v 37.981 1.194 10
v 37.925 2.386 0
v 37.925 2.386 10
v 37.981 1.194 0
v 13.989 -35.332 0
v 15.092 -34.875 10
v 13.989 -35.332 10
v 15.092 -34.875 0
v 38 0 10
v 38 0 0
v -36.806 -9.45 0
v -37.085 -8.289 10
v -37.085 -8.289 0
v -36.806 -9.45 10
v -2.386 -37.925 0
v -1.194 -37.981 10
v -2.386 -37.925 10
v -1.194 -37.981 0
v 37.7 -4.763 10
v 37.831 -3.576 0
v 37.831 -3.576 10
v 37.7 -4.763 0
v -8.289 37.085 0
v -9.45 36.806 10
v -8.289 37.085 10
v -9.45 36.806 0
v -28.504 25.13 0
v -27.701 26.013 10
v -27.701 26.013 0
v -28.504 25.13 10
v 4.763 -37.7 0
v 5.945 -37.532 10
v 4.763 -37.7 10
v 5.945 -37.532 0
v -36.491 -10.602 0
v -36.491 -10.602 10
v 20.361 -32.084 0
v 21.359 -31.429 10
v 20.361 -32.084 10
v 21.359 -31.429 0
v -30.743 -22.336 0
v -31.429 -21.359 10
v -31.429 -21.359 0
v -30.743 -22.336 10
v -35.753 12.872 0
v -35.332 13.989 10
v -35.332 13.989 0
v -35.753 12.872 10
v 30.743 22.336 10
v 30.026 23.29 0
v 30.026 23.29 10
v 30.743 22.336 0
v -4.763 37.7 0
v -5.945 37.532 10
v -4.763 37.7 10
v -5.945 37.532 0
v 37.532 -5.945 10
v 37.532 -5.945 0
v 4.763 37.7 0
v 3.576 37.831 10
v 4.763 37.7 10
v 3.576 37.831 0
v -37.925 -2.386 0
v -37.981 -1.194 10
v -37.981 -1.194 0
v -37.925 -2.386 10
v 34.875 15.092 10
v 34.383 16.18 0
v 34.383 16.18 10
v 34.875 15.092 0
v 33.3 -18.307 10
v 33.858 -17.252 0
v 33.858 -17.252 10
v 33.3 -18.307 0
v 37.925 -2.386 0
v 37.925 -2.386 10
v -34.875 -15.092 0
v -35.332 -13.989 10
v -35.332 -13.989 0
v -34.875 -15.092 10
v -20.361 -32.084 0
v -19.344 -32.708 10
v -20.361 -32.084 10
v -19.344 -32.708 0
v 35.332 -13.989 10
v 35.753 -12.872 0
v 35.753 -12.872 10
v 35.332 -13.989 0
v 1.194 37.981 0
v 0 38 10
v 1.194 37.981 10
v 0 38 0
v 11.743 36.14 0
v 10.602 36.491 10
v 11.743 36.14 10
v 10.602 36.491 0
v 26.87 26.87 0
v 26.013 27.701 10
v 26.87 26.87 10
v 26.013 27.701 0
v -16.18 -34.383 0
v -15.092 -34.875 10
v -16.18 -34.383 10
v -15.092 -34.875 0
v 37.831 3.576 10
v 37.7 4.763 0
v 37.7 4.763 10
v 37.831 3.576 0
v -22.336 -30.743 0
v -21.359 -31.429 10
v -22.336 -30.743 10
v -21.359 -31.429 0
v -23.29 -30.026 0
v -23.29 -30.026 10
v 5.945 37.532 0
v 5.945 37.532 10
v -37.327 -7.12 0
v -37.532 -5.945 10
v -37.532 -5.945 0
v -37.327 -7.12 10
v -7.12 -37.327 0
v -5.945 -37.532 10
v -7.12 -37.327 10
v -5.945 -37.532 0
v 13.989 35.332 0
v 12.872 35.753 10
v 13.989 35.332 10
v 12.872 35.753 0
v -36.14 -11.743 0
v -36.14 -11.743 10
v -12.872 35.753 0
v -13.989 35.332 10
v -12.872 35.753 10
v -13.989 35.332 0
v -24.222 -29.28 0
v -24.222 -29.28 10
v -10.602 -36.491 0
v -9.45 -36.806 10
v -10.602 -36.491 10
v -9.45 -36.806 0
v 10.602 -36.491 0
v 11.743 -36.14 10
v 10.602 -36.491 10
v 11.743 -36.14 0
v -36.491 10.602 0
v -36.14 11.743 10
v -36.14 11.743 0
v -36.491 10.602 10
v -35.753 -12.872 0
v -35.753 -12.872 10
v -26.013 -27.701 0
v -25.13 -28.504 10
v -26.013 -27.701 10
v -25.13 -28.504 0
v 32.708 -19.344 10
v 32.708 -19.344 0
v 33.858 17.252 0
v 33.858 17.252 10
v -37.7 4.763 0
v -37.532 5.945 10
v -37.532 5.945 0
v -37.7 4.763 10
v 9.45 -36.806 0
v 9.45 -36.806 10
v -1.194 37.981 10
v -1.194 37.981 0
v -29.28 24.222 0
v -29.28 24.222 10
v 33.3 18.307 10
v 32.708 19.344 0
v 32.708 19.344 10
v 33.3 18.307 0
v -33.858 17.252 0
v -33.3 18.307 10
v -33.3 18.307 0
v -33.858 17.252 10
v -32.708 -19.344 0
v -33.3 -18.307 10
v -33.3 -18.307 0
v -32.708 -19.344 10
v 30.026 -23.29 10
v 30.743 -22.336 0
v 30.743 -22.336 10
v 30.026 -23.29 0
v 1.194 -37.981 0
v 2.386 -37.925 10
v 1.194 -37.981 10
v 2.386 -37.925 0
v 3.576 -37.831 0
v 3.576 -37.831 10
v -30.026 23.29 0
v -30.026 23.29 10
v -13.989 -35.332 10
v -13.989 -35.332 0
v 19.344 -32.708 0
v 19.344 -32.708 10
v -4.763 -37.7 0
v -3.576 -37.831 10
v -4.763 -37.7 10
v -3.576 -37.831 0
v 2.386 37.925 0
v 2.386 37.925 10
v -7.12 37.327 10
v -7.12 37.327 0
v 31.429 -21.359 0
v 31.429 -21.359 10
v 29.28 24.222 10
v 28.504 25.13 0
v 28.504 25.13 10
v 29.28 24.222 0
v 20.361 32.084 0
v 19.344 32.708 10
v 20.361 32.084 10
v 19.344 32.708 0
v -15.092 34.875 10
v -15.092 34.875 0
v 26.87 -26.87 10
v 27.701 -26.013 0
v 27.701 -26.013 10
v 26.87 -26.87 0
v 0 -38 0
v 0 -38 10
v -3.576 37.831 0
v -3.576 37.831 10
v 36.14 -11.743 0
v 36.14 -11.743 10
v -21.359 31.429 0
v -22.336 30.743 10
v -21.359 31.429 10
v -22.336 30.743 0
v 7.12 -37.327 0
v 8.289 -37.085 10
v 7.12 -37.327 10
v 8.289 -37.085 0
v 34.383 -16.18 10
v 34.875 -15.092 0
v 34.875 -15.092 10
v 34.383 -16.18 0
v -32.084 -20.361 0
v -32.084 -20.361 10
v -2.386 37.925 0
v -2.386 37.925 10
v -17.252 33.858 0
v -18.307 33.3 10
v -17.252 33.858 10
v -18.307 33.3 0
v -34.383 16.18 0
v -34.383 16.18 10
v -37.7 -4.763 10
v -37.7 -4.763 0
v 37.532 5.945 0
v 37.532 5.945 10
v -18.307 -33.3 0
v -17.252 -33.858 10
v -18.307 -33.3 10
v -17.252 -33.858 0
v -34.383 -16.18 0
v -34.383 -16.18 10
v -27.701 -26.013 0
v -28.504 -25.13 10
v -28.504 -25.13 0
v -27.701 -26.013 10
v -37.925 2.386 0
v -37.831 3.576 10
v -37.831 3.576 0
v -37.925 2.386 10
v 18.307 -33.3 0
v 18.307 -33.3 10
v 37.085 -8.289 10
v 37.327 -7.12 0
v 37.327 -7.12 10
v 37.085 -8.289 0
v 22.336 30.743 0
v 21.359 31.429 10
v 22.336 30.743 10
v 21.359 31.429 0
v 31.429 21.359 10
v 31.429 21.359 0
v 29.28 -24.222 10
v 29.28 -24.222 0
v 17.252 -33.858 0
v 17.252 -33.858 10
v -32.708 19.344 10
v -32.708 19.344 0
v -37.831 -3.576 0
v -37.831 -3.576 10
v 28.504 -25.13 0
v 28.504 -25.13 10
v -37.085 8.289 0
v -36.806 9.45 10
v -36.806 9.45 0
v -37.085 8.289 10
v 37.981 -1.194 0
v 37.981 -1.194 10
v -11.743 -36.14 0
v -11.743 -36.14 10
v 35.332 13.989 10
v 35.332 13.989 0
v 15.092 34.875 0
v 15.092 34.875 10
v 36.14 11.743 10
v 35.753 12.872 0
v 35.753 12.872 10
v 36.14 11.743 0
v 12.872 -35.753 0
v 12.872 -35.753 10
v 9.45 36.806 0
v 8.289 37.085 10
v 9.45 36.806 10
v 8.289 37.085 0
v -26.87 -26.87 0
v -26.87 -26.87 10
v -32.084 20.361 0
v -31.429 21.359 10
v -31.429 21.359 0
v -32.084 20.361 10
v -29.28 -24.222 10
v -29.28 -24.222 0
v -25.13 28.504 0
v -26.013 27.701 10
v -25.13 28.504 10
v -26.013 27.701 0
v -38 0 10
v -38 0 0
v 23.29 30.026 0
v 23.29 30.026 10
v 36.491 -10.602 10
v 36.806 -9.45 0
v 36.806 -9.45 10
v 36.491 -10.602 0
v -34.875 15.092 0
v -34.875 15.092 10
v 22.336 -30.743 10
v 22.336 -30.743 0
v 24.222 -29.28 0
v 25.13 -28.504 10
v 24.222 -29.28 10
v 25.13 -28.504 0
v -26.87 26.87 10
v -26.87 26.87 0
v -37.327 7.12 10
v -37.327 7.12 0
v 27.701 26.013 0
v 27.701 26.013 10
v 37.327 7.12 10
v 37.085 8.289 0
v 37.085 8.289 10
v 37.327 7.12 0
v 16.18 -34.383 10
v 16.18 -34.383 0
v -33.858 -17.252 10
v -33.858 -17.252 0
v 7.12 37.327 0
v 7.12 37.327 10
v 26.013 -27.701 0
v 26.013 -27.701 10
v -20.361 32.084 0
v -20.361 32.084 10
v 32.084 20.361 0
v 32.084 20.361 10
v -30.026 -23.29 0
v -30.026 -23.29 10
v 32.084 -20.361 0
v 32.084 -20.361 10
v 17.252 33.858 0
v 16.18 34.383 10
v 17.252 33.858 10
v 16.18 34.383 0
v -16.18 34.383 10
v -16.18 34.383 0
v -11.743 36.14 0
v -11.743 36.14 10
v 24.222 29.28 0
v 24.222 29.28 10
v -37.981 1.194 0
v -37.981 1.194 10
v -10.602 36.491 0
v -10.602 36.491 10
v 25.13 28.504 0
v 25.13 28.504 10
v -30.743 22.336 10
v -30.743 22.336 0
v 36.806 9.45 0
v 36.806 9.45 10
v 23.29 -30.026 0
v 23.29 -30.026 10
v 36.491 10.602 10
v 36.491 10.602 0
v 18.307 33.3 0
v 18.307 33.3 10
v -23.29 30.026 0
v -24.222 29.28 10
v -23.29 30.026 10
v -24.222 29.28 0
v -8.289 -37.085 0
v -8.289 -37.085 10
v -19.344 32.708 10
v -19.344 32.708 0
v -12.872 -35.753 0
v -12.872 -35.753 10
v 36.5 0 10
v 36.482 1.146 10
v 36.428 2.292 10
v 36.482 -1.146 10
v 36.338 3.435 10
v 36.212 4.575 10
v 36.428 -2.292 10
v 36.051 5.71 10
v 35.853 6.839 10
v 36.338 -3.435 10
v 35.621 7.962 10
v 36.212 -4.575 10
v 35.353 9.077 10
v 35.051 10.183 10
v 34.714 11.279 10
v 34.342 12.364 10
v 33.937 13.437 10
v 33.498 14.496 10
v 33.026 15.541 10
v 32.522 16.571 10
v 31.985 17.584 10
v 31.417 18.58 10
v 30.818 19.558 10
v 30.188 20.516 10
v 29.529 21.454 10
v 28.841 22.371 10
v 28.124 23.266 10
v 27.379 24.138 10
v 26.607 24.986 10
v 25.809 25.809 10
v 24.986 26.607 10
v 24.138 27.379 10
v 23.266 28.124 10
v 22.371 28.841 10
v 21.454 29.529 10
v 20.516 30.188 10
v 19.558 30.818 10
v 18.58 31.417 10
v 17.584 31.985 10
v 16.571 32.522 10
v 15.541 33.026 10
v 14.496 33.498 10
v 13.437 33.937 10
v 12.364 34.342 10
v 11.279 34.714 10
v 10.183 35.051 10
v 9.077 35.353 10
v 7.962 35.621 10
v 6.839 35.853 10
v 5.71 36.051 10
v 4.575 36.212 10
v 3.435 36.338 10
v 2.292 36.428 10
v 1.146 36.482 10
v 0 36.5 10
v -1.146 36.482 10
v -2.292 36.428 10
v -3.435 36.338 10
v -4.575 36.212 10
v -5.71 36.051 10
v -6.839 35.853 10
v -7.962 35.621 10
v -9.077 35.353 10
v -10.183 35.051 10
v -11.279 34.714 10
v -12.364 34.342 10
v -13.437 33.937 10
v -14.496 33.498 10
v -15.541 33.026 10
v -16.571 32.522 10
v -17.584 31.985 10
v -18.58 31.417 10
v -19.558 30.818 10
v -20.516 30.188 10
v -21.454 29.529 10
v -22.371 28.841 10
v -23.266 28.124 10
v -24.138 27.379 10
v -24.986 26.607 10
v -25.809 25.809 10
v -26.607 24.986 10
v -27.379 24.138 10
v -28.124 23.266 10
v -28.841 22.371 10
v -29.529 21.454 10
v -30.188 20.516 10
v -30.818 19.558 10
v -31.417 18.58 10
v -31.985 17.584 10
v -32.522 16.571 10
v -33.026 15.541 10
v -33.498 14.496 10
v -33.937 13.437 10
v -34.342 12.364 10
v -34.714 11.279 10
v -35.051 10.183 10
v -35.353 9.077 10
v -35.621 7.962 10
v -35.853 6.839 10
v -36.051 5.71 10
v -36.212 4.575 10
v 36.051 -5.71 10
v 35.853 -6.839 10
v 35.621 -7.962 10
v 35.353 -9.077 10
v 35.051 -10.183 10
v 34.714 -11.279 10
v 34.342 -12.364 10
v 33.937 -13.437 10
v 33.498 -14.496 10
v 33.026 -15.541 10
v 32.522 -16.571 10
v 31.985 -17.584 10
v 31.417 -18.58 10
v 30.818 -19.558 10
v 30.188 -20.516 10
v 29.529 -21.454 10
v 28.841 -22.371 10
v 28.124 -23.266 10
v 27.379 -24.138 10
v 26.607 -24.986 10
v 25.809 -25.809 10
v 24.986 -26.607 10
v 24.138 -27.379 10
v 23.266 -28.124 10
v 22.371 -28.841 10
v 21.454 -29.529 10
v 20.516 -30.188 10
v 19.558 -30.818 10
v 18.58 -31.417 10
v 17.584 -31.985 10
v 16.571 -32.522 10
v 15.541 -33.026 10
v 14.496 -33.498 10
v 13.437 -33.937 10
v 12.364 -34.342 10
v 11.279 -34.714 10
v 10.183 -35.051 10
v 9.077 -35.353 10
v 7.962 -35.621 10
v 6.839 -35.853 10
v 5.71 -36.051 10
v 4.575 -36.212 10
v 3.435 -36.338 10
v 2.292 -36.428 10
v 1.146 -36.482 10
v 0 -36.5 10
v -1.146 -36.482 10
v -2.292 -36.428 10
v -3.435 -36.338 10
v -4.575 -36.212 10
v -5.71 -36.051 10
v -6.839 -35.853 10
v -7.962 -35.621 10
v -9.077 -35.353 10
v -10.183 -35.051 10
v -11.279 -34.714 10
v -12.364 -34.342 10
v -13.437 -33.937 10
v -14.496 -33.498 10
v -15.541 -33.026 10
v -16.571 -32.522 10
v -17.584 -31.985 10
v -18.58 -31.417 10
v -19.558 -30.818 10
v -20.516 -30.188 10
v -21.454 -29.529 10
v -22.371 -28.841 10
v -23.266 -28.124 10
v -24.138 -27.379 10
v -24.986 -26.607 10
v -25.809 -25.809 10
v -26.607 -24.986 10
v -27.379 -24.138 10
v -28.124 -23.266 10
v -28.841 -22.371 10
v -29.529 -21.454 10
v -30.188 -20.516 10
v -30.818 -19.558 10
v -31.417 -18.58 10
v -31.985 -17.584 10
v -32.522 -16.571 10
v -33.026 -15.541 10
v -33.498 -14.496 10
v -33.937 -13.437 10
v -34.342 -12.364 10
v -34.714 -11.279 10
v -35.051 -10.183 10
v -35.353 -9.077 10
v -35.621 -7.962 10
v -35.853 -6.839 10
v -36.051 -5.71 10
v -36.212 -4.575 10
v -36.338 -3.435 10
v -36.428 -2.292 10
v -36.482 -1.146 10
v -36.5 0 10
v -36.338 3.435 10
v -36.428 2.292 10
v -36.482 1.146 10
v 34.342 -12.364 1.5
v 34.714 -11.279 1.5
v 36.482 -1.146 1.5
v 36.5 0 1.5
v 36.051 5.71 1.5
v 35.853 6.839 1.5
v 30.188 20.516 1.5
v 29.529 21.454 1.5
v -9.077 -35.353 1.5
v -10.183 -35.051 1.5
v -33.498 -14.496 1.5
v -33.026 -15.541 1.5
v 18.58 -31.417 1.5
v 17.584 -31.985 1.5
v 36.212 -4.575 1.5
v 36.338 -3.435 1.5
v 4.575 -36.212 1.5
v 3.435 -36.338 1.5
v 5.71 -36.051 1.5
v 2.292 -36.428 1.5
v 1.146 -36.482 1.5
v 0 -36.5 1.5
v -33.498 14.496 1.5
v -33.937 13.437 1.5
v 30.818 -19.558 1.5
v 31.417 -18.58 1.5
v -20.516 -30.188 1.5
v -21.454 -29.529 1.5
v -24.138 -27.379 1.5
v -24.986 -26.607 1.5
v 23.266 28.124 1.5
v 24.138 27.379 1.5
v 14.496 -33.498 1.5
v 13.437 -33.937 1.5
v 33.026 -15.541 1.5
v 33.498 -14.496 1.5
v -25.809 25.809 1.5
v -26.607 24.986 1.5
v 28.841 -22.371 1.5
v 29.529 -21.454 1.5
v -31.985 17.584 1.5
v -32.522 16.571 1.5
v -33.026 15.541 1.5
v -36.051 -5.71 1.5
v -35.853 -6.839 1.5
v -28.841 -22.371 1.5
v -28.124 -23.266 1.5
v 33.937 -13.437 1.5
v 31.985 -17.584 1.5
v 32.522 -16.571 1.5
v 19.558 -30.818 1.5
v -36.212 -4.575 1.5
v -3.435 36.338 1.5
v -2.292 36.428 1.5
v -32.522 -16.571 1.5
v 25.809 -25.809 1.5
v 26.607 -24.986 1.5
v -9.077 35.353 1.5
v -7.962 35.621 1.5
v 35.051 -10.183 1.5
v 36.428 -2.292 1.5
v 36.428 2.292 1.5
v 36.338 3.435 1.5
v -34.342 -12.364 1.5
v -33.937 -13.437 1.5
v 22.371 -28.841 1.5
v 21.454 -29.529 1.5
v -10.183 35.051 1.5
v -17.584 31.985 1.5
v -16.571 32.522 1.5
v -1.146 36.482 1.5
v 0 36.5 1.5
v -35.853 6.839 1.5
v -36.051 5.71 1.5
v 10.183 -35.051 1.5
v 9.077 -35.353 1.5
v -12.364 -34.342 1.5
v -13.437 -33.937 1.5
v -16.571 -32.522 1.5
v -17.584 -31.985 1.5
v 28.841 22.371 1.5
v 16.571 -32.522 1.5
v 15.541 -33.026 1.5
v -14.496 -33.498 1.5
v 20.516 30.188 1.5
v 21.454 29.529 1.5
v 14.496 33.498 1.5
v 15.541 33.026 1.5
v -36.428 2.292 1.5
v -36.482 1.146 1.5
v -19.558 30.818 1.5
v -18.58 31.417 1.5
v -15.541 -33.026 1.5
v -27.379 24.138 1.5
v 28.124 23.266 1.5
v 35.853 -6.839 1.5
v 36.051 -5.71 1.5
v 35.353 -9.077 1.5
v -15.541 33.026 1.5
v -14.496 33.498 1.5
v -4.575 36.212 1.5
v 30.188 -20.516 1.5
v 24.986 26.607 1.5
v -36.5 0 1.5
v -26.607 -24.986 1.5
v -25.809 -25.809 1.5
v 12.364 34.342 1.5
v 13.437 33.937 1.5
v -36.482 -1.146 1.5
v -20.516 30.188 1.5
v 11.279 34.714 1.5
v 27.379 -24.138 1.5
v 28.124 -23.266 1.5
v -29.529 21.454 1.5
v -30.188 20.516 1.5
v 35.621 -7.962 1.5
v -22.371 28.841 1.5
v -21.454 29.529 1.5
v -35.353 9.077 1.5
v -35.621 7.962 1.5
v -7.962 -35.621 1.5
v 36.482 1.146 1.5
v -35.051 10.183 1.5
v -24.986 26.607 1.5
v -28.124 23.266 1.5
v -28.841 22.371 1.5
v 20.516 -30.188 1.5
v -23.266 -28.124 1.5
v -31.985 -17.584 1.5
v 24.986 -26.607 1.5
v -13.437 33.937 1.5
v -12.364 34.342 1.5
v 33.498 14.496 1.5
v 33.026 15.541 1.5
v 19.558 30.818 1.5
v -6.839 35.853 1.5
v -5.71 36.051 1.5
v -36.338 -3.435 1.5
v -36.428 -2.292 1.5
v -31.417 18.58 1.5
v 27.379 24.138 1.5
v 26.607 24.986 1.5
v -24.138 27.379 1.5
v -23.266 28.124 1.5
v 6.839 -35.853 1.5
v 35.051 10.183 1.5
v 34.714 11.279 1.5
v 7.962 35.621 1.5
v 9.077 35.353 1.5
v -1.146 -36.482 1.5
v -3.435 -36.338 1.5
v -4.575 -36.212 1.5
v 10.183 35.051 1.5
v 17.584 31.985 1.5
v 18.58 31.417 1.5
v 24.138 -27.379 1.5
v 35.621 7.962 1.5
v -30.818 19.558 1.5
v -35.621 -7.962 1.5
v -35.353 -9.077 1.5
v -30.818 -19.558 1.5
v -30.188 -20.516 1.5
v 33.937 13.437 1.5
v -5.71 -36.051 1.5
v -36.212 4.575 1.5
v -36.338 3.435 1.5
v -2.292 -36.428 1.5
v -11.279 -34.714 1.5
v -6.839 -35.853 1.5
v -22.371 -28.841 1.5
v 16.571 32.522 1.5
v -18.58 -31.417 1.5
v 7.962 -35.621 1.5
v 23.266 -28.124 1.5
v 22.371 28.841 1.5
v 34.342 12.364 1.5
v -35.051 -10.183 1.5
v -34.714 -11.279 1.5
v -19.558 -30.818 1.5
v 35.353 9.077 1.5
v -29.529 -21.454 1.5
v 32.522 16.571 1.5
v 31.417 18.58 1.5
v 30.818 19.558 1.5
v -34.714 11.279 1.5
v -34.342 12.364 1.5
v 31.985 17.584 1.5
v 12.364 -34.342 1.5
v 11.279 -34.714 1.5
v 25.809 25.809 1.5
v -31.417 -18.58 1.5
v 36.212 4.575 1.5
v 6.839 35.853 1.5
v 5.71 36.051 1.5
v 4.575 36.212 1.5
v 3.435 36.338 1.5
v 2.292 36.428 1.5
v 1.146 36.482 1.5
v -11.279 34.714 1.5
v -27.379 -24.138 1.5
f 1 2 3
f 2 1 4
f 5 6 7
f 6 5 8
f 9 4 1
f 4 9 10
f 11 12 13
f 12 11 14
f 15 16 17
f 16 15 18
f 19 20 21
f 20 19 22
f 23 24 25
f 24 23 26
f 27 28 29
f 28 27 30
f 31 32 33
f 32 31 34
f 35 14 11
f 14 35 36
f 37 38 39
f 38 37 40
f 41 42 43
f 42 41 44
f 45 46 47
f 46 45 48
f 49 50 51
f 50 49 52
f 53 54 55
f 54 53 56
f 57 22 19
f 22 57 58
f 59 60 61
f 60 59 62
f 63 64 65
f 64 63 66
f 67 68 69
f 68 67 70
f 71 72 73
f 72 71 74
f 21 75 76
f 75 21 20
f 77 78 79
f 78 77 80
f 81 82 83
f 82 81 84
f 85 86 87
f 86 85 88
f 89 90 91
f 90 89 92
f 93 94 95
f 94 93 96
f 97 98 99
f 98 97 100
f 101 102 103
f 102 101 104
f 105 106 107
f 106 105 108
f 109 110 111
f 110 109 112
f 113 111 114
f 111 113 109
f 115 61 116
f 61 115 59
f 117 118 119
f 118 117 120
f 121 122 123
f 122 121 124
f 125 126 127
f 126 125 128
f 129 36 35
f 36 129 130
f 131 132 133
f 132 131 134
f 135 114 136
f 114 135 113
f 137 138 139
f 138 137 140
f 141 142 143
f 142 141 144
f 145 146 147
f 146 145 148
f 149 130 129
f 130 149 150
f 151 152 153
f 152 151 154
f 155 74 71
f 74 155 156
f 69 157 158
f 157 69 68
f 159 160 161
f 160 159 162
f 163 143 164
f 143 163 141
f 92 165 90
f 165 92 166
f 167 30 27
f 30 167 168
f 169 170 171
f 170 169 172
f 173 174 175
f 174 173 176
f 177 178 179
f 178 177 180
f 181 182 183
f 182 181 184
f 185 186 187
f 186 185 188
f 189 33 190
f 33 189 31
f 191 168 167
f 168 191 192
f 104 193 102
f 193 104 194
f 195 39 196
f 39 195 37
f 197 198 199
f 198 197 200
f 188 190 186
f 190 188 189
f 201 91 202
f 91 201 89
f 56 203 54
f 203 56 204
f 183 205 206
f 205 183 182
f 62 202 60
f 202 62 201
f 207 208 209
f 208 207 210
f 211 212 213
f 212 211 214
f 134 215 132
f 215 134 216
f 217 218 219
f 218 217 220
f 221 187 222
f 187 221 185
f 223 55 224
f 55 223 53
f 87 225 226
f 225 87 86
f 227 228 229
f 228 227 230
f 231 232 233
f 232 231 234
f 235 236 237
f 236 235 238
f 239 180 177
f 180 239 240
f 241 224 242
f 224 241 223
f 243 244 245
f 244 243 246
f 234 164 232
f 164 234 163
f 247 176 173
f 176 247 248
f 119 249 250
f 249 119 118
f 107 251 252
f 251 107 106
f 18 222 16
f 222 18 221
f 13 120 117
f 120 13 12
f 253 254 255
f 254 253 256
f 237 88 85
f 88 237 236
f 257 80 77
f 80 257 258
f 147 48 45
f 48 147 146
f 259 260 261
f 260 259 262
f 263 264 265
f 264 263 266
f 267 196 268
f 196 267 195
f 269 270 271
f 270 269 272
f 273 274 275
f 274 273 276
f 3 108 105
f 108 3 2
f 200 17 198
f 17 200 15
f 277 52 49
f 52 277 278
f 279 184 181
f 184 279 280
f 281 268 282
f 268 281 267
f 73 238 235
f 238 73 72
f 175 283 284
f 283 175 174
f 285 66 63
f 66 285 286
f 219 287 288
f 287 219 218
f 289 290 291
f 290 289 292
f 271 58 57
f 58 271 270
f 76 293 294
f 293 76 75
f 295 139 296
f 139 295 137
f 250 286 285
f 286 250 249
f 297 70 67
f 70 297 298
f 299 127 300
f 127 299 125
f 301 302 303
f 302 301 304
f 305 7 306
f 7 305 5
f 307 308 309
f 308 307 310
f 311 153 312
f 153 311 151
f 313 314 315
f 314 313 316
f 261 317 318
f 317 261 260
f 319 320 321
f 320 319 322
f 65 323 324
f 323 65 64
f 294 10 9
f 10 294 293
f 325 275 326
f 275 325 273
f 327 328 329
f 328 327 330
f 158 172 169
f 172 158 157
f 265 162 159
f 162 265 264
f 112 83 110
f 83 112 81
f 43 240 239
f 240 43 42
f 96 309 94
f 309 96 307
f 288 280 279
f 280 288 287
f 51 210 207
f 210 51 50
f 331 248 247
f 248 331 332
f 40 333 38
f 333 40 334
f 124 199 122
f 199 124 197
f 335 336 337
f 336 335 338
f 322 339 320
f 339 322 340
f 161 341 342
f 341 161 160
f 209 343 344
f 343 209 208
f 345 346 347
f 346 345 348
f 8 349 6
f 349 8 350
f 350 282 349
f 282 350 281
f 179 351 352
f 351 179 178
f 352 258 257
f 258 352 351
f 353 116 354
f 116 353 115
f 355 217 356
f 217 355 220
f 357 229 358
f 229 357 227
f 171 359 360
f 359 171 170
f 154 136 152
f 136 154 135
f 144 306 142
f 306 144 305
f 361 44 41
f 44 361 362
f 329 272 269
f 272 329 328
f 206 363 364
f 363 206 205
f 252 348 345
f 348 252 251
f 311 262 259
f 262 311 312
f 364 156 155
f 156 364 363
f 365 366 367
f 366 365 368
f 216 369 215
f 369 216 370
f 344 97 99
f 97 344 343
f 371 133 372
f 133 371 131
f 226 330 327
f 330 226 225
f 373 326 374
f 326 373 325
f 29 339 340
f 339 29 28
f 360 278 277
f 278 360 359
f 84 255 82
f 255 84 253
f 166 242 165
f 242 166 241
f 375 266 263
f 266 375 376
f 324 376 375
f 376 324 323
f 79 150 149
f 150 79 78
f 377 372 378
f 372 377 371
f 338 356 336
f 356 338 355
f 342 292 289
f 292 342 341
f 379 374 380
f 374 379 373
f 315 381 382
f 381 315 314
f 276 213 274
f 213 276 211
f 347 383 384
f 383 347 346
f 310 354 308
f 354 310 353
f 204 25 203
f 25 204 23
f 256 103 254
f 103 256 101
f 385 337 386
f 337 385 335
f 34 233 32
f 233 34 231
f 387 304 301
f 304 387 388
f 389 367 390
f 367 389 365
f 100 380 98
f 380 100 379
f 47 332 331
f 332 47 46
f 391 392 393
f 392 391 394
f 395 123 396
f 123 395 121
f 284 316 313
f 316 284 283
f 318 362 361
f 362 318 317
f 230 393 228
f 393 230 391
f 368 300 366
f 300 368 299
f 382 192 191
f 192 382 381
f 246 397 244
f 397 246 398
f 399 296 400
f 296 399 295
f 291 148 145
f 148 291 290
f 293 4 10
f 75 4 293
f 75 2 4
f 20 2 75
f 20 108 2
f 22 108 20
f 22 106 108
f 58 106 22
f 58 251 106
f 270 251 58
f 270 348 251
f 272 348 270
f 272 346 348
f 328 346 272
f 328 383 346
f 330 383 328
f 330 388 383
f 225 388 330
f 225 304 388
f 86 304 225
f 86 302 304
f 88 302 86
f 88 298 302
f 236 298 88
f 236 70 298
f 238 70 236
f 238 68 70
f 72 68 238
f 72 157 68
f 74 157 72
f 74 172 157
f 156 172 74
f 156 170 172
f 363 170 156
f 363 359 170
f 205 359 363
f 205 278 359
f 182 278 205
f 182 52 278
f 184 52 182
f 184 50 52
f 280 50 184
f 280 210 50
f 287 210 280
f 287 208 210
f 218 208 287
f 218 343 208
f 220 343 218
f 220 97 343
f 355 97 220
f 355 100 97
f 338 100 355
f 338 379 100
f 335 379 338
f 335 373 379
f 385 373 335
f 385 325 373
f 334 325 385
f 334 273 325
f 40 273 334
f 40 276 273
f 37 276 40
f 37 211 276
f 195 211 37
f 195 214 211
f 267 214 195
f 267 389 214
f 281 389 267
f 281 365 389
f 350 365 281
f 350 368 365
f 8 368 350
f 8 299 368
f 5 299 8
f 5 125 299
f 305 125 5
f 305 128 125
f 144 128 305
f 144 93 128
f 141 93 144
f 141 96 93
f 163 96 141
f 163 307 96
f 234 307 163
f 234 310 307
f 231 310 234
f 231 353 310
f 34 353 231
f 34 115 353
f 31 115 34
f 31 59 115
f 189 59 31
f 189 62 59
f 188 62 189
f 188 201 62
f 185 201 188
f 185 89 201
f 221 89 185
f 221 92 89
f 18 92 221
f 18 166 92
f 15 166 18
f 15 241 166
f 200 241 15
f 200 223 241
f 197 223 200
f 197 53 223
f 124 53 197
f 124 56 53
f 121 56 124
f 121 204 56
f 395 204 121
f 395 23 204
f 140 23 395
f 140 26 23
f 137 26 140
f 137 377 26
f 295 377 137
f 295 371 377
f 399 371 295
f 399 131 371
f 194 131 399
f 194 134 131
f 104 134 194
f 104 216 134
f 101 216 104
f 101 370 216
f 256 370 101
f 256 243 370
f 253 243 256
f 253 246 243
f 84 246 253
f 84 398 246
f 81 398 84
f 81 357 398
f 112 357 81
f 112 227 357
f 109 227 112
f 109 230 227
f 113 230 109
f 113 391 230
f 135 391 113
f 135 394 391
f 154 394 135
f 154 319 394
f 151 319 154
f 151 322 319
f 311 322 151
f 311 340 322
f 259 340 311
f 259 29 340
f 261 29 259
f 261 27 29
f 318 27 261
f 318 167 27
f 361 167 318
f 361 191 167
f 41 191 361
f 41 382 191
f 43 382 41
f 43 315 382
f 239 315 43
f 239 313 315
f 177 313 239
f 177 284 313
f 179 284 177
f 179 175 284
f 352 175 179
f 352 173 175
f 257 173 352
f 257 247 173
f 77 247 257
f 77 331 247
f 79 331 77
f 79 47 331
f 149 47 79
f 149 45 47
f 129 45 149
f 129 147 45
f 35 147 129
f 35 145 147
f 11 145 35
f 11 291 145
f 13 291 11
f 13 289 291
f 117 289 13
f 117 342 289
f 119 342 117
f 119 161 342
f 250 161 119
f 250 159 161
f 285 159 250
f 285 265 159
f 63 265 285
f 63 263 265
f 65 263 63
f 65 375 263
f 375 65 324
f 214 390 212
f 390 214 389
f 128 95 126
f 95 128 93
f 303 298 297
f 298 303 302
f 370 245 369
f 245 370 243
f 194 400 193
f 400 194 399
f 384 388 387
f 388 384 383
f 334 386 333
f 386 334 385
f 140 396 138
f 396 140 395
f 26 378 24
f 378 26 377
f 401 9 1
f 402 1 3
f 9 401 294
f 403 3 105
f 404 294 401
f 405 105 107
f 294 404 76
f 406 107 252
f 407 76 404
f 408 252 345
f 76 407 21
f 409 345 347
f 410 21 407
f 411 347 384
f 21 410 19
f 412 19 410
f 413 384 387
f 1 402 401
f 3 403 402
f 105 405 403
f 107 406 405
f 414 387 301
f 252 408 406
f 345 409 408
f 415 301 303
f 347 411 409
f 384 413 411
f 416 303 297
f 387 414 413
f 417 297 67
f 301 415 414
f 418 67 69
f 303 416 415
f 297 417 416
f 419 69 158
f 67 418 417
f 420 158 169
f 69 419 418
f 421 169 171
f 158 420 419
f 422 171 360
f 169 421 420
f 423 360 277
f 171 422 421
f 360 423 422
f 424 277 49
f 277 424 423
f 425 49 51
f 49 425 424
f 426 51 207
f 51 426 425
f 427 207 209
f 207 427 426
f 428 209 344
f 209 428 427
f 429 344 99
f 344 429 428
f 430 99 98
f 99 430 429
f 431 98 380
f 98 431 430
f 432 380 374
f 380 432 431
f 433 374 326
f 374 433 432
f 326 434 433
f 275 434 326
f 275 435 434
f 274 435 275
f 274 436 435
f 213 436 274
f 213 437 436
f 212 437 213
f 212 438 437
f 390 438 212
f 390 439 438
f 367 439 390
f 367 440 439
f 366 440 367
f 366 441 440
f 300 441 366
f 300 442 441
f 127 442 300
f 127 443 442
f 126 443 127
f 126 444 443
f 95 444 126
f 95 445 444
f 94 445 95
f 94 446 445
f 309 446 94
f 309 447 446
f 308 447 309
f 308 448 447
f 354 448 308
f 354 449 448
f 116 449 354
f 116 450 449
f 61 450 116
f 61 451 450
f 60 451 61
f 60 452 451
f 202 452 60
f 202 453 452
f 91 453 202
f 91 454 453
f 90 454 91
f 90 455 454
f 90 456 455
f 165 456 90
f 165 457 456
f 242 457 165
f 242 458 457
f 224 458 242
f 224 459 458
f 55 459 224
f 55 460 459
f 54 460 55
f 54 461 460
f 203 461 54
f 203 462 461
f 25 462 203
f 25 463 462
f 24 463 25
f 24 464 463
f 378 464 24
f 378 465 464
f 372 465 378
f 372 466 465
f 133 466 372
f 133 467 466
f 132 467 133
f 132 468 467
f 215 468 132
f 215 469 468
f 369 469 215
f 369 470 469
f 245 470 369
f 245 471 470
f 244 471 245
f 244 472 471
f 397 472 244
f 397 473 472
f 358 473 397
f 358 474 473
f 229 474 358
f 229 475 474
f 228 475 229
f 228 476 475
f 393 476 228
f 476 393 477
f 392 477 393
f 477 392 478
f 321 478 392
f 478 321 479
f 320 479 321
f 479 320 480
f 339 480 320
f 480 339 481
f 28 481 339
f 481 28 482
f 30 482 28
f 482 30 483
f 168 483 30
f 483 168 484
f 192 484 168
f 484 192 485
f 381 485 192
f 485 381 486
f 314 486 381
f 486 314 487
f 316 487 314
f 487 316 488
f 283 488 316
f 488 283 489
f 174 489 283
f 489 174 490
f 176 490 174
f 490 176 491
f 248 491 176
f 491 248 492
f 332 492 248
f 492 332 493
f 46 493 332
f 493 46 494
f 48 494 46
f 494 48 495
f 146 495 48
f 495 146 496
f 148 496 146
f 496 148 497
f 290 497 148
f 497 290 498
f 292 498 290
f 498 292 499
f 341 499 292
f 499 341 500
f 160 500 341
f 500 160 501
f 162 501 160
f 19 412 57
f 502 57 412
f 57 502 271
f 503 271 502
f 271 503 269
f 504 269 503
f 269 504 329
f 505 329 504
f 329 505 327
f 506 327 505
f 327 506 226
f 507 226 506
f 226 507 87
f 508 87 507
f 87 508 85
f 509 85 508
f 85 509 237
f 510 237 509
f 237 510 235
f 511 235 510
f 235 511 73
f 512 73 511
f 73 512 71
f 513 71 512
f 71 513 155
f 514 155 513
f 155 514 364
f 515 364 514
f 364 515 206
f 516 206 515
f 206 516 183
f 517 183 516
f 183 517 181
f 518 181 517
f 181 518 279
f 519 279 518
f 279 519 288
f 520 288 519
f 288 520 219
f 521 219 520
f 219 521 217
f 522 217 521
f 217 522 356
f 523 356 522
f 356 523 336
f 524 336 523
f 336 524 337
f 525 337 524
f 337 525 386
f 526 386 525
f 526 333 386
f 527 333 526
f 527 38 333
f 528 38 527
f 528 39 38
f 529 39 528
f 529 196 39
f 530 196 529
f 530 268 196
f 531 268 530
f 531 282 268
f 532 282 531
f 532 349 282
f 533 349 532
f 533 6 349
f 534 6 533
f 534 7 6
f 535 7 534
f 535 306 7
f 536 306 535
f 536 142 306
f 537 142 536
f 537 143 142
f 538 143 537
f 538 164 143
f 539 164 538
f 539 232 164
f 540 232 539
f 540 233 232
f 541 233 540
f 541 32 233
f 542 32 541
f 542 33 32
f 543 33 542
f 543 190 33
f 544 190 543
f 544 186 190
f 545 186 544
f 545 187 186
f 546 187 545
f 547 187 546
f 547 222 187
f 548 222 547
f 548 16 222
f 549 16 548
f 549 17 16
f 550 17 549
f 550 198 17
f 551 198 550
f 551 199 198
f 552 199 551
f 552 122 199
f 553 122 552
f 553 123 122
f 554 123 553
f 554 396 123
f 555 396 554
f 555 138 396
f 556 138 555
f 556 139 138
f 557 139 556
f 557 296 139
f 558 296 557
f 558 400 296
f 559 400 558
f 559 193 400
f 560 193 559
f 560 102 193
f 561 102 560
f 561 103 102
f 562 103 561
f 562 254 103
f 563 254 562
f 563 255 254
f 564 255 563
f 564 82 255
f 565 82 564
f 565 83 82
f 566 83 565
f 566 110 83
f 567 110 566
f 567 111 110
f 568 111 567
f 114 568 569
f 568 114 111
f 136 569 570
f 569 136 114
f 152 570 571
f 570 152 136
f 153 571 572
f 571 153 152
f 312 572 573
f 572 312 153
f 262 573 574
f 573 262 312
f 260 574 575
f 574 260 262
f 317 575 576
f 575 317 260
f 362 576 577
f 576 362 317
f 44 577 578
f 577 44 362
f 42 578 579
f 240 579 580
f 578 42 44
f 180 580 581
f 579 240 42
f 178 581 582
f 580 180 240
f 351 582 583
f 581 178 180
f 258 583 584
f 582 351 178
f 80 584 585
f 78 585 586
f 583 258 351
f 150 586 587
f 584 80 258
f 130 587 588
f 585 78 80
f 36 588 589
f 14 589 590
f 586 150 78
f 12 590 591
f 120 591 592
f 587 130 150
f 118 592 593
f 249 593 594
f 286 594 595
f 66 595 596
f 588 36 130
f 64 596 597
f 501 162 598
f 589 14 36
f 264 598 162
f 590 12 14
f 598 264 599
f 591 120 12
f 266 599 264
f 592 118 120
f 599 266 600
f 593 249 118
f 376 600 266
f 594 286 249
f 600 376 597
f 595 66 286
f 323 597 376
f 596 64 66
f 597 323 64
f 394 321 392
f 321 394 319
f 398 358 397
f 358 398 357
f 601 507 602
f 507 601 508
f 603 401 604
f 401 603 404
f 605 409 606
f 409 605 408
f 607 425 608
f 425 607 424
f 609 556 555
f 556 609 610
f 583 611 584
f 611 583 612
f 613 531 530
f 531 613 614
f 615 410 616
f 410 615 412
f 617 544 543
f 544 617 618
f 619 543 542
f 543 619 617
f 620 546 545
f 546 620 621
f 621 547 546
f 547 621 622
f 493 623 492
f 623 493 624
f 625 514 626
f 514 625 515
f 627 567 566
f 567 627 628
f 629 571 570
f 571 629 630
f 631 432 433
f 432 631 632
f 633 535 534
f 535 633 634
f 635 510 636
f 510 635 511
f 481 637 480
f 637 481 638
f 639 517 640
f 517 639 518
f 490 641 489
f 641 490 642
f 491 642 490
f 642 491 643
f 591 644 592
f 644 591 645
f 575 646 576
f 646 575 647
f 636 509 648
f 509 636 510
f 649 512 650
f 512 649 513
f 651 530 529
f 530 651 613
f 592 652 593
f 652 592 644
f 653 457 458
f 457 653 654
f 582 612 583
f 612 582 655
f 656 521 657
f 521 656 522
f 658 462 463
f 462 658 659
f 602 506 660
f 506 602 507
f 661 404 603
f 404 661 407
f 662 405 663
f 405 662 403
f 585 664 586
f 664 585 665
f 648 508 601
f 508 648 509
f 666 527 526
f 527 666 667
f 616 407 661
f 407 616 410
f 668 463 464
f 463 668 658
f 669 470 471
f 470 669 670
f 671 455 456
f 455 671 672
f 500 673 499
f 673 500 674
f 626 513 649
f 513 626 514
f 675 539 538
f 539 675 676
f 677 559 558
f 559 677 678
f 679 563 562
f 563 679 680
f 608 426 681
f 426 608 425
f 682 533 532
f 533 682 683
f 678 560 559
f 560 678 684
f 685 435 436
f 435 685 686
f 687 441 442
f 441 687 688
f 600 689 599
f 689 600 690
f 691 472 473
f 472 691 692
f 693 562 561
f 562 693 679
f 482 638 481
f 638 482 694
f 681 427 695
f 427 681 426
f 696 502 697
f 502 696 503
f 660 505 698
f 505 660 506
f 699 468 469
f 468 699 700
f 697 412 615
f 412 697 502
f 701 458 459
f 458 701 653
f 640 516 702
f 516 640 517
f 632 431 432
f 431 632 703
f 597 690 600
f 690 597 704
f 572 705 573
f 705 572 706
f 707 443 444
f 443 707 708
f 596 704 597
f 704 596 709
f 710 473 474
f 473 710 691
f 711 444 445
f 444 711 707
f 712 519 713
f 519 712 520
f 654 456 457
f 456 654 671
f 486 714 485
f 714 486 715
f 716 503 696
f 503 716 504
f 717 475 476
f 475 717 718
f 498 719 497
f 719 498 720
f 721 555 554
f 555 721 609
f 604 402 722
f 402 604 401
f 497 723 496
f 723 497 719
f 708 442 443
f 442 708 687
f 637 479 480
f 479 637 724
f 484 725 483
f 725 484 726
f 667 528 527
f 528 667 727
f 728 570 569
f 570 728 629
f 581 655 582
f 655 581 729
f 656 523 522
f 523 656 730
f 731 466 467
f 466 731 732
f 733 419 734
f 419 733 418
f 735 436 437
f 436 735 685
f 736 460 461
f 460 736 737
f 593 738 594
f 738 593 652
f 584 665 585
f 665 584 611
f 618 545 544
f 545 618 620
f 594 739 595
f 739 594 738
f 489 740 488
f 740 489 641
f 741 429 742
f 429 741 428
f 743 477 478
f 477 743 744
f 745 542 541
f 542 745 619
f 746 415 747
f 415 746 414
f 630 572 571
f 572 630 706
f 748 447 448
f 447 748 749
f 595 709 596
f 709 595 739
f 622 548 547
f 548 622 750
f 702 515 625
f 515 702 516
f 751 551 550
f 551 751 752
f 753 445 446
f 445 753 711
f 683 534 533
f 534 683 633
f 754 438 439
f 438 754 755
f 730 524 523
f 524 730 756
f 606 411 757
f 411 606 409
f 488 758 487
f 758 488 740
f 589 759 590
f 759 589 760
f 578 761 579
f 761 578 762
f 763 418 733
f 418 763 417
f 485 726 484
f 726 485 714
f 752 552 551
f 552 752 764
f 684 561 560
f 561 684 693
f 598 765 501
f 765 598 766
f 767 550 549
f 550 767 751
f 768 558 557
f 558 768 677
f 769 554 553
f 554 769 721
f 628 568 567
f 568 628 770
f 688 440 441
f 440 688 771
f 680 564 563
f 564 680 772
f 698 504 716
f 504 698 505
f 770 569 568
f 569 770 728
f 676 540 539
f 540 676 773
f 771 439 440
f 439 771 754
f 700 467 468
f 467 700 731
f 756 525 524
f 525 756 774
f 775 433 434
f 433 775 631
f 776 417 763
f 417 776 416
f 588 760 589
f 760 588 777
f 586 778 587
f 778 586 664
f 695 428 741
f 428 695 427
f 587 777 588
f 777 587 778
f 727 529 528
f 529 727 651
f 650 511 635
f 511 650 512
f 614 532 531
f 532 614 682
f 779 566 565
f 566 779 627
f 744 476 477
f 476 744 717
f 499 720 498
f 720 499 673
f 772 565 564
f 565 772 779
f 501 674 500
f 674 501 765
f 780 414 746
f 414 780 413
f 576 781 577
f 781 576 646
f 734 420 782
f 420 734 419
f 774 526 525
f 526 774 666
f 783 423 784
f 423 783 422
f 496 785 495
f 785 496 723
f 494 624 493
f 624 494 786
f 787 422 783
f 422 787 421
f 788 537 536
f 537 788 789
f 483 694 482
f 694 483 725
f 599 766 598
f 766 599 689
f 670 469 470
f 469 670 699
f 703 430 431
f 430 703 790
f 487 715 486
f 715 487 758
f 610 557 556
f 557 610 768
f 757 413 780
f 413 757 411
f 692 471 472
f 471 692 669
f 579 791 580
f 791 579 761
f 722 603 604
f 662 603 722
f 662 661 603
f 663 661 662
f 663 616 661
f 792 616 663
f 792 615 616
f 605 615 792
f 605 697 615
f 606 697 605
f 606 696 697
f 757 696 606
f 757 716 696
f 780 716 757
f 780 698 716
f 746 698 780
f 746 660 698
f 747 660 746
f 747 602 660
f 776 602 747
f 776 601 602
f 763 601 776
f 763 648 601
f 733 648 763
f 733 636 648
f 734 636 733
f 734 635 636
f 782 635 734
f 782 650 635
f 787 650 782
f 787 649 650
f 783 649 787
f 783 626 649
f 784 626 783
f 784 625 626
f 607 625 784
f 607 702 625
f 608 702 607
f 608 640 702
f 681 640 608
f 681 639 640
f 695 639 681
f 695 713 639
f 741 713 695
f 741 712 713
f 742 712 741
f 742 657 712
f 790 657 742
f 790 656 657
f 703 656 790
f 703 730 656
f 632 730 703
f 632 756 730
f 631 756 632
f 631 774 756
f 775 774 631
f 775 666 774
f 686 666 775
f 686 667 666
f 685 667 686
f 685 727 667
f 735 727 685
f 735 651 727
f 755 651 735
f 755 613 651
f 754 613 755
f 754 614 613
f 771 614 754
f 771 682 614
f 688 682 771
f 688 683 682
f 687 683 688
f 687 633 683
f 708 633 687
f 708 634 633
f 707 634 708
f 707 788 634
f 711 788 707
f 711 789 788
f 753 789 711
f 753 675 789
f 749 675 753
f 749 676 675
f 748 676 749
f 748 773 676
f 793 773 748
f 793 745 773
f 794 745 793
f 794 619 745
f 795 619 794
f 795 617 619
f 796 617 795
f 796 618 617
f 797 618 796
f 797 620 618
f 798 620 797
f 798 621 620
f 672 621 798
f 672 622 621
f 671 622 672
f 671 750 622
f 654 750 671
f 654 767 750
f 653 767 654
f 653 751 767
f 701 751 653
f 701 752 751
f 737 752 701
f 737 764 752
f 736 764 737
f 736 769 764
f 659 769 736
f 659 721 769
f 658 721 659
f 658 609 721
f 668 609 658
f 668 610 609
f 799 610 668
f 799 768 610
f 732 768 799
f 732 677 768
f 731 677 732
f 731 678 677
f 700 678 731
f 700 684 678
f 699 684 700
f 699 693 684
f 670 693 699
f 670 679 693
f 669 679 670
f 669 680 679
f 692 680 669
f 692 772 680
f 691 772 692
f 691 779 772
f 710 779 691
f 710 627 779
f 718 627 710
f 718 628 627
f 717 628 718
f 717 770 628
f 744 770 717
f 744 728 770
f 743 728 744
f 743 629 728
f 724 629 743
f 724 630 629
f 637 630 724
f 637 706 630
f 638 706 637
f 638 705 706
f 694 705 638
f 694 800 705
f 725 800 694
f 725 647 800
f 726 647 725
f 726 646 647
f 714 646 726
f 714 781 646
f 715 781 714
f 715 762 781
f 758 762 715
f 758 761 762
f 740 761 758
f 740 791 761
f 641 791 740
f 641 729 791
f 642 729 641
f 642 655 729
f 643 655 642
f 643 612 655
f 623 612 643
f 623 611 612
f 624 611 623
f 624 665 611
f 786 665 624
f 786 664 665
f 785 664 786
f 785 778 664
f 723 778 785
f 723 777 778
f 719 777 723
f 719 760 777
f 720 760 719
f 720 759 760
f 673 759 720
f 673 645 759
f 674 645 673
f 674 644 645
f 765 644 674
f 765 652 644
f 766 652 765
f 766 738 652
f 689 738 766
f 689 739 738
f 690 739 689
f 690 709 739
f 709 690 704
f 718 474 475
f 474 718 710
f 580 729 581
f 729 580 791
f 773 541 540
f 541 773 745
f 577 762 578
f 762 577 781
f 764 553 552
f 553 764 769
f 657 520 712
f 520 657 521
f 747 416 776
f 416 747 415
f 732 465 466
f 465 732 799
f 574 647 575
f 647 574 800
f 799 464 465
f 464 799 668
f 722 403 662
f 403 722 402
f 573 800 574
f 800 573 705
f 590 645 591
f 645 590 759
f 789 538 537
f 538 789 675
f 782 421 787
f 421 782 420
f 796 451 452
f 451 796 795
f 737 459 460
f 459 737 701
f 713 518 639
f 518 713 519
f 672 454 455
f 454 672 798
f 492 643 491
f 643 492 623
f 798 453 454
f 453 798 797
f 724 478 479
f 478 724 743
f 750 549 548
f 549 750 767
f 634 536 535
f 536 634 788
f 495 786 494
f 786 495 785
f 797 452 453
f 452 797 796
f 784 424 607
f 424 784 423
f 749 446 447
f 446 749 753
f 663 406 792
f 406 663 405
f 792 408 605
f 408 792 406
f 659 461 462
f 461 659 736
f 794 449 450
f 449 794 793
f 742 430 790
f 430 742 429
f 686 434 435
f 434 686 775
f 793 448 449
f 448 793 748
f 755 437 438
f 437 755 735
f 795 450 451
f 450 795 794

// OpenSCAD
h=10;
d=73;
w=1.5;

difference() {
  linear_extrude(h) {
    circle(d=(d + 2 * w), $fn=200);
  }
  translate([0, 0, w]) {
    linear_extrude(h - w) {
      circle(d=d, $fn=200);
    }
  }
}
